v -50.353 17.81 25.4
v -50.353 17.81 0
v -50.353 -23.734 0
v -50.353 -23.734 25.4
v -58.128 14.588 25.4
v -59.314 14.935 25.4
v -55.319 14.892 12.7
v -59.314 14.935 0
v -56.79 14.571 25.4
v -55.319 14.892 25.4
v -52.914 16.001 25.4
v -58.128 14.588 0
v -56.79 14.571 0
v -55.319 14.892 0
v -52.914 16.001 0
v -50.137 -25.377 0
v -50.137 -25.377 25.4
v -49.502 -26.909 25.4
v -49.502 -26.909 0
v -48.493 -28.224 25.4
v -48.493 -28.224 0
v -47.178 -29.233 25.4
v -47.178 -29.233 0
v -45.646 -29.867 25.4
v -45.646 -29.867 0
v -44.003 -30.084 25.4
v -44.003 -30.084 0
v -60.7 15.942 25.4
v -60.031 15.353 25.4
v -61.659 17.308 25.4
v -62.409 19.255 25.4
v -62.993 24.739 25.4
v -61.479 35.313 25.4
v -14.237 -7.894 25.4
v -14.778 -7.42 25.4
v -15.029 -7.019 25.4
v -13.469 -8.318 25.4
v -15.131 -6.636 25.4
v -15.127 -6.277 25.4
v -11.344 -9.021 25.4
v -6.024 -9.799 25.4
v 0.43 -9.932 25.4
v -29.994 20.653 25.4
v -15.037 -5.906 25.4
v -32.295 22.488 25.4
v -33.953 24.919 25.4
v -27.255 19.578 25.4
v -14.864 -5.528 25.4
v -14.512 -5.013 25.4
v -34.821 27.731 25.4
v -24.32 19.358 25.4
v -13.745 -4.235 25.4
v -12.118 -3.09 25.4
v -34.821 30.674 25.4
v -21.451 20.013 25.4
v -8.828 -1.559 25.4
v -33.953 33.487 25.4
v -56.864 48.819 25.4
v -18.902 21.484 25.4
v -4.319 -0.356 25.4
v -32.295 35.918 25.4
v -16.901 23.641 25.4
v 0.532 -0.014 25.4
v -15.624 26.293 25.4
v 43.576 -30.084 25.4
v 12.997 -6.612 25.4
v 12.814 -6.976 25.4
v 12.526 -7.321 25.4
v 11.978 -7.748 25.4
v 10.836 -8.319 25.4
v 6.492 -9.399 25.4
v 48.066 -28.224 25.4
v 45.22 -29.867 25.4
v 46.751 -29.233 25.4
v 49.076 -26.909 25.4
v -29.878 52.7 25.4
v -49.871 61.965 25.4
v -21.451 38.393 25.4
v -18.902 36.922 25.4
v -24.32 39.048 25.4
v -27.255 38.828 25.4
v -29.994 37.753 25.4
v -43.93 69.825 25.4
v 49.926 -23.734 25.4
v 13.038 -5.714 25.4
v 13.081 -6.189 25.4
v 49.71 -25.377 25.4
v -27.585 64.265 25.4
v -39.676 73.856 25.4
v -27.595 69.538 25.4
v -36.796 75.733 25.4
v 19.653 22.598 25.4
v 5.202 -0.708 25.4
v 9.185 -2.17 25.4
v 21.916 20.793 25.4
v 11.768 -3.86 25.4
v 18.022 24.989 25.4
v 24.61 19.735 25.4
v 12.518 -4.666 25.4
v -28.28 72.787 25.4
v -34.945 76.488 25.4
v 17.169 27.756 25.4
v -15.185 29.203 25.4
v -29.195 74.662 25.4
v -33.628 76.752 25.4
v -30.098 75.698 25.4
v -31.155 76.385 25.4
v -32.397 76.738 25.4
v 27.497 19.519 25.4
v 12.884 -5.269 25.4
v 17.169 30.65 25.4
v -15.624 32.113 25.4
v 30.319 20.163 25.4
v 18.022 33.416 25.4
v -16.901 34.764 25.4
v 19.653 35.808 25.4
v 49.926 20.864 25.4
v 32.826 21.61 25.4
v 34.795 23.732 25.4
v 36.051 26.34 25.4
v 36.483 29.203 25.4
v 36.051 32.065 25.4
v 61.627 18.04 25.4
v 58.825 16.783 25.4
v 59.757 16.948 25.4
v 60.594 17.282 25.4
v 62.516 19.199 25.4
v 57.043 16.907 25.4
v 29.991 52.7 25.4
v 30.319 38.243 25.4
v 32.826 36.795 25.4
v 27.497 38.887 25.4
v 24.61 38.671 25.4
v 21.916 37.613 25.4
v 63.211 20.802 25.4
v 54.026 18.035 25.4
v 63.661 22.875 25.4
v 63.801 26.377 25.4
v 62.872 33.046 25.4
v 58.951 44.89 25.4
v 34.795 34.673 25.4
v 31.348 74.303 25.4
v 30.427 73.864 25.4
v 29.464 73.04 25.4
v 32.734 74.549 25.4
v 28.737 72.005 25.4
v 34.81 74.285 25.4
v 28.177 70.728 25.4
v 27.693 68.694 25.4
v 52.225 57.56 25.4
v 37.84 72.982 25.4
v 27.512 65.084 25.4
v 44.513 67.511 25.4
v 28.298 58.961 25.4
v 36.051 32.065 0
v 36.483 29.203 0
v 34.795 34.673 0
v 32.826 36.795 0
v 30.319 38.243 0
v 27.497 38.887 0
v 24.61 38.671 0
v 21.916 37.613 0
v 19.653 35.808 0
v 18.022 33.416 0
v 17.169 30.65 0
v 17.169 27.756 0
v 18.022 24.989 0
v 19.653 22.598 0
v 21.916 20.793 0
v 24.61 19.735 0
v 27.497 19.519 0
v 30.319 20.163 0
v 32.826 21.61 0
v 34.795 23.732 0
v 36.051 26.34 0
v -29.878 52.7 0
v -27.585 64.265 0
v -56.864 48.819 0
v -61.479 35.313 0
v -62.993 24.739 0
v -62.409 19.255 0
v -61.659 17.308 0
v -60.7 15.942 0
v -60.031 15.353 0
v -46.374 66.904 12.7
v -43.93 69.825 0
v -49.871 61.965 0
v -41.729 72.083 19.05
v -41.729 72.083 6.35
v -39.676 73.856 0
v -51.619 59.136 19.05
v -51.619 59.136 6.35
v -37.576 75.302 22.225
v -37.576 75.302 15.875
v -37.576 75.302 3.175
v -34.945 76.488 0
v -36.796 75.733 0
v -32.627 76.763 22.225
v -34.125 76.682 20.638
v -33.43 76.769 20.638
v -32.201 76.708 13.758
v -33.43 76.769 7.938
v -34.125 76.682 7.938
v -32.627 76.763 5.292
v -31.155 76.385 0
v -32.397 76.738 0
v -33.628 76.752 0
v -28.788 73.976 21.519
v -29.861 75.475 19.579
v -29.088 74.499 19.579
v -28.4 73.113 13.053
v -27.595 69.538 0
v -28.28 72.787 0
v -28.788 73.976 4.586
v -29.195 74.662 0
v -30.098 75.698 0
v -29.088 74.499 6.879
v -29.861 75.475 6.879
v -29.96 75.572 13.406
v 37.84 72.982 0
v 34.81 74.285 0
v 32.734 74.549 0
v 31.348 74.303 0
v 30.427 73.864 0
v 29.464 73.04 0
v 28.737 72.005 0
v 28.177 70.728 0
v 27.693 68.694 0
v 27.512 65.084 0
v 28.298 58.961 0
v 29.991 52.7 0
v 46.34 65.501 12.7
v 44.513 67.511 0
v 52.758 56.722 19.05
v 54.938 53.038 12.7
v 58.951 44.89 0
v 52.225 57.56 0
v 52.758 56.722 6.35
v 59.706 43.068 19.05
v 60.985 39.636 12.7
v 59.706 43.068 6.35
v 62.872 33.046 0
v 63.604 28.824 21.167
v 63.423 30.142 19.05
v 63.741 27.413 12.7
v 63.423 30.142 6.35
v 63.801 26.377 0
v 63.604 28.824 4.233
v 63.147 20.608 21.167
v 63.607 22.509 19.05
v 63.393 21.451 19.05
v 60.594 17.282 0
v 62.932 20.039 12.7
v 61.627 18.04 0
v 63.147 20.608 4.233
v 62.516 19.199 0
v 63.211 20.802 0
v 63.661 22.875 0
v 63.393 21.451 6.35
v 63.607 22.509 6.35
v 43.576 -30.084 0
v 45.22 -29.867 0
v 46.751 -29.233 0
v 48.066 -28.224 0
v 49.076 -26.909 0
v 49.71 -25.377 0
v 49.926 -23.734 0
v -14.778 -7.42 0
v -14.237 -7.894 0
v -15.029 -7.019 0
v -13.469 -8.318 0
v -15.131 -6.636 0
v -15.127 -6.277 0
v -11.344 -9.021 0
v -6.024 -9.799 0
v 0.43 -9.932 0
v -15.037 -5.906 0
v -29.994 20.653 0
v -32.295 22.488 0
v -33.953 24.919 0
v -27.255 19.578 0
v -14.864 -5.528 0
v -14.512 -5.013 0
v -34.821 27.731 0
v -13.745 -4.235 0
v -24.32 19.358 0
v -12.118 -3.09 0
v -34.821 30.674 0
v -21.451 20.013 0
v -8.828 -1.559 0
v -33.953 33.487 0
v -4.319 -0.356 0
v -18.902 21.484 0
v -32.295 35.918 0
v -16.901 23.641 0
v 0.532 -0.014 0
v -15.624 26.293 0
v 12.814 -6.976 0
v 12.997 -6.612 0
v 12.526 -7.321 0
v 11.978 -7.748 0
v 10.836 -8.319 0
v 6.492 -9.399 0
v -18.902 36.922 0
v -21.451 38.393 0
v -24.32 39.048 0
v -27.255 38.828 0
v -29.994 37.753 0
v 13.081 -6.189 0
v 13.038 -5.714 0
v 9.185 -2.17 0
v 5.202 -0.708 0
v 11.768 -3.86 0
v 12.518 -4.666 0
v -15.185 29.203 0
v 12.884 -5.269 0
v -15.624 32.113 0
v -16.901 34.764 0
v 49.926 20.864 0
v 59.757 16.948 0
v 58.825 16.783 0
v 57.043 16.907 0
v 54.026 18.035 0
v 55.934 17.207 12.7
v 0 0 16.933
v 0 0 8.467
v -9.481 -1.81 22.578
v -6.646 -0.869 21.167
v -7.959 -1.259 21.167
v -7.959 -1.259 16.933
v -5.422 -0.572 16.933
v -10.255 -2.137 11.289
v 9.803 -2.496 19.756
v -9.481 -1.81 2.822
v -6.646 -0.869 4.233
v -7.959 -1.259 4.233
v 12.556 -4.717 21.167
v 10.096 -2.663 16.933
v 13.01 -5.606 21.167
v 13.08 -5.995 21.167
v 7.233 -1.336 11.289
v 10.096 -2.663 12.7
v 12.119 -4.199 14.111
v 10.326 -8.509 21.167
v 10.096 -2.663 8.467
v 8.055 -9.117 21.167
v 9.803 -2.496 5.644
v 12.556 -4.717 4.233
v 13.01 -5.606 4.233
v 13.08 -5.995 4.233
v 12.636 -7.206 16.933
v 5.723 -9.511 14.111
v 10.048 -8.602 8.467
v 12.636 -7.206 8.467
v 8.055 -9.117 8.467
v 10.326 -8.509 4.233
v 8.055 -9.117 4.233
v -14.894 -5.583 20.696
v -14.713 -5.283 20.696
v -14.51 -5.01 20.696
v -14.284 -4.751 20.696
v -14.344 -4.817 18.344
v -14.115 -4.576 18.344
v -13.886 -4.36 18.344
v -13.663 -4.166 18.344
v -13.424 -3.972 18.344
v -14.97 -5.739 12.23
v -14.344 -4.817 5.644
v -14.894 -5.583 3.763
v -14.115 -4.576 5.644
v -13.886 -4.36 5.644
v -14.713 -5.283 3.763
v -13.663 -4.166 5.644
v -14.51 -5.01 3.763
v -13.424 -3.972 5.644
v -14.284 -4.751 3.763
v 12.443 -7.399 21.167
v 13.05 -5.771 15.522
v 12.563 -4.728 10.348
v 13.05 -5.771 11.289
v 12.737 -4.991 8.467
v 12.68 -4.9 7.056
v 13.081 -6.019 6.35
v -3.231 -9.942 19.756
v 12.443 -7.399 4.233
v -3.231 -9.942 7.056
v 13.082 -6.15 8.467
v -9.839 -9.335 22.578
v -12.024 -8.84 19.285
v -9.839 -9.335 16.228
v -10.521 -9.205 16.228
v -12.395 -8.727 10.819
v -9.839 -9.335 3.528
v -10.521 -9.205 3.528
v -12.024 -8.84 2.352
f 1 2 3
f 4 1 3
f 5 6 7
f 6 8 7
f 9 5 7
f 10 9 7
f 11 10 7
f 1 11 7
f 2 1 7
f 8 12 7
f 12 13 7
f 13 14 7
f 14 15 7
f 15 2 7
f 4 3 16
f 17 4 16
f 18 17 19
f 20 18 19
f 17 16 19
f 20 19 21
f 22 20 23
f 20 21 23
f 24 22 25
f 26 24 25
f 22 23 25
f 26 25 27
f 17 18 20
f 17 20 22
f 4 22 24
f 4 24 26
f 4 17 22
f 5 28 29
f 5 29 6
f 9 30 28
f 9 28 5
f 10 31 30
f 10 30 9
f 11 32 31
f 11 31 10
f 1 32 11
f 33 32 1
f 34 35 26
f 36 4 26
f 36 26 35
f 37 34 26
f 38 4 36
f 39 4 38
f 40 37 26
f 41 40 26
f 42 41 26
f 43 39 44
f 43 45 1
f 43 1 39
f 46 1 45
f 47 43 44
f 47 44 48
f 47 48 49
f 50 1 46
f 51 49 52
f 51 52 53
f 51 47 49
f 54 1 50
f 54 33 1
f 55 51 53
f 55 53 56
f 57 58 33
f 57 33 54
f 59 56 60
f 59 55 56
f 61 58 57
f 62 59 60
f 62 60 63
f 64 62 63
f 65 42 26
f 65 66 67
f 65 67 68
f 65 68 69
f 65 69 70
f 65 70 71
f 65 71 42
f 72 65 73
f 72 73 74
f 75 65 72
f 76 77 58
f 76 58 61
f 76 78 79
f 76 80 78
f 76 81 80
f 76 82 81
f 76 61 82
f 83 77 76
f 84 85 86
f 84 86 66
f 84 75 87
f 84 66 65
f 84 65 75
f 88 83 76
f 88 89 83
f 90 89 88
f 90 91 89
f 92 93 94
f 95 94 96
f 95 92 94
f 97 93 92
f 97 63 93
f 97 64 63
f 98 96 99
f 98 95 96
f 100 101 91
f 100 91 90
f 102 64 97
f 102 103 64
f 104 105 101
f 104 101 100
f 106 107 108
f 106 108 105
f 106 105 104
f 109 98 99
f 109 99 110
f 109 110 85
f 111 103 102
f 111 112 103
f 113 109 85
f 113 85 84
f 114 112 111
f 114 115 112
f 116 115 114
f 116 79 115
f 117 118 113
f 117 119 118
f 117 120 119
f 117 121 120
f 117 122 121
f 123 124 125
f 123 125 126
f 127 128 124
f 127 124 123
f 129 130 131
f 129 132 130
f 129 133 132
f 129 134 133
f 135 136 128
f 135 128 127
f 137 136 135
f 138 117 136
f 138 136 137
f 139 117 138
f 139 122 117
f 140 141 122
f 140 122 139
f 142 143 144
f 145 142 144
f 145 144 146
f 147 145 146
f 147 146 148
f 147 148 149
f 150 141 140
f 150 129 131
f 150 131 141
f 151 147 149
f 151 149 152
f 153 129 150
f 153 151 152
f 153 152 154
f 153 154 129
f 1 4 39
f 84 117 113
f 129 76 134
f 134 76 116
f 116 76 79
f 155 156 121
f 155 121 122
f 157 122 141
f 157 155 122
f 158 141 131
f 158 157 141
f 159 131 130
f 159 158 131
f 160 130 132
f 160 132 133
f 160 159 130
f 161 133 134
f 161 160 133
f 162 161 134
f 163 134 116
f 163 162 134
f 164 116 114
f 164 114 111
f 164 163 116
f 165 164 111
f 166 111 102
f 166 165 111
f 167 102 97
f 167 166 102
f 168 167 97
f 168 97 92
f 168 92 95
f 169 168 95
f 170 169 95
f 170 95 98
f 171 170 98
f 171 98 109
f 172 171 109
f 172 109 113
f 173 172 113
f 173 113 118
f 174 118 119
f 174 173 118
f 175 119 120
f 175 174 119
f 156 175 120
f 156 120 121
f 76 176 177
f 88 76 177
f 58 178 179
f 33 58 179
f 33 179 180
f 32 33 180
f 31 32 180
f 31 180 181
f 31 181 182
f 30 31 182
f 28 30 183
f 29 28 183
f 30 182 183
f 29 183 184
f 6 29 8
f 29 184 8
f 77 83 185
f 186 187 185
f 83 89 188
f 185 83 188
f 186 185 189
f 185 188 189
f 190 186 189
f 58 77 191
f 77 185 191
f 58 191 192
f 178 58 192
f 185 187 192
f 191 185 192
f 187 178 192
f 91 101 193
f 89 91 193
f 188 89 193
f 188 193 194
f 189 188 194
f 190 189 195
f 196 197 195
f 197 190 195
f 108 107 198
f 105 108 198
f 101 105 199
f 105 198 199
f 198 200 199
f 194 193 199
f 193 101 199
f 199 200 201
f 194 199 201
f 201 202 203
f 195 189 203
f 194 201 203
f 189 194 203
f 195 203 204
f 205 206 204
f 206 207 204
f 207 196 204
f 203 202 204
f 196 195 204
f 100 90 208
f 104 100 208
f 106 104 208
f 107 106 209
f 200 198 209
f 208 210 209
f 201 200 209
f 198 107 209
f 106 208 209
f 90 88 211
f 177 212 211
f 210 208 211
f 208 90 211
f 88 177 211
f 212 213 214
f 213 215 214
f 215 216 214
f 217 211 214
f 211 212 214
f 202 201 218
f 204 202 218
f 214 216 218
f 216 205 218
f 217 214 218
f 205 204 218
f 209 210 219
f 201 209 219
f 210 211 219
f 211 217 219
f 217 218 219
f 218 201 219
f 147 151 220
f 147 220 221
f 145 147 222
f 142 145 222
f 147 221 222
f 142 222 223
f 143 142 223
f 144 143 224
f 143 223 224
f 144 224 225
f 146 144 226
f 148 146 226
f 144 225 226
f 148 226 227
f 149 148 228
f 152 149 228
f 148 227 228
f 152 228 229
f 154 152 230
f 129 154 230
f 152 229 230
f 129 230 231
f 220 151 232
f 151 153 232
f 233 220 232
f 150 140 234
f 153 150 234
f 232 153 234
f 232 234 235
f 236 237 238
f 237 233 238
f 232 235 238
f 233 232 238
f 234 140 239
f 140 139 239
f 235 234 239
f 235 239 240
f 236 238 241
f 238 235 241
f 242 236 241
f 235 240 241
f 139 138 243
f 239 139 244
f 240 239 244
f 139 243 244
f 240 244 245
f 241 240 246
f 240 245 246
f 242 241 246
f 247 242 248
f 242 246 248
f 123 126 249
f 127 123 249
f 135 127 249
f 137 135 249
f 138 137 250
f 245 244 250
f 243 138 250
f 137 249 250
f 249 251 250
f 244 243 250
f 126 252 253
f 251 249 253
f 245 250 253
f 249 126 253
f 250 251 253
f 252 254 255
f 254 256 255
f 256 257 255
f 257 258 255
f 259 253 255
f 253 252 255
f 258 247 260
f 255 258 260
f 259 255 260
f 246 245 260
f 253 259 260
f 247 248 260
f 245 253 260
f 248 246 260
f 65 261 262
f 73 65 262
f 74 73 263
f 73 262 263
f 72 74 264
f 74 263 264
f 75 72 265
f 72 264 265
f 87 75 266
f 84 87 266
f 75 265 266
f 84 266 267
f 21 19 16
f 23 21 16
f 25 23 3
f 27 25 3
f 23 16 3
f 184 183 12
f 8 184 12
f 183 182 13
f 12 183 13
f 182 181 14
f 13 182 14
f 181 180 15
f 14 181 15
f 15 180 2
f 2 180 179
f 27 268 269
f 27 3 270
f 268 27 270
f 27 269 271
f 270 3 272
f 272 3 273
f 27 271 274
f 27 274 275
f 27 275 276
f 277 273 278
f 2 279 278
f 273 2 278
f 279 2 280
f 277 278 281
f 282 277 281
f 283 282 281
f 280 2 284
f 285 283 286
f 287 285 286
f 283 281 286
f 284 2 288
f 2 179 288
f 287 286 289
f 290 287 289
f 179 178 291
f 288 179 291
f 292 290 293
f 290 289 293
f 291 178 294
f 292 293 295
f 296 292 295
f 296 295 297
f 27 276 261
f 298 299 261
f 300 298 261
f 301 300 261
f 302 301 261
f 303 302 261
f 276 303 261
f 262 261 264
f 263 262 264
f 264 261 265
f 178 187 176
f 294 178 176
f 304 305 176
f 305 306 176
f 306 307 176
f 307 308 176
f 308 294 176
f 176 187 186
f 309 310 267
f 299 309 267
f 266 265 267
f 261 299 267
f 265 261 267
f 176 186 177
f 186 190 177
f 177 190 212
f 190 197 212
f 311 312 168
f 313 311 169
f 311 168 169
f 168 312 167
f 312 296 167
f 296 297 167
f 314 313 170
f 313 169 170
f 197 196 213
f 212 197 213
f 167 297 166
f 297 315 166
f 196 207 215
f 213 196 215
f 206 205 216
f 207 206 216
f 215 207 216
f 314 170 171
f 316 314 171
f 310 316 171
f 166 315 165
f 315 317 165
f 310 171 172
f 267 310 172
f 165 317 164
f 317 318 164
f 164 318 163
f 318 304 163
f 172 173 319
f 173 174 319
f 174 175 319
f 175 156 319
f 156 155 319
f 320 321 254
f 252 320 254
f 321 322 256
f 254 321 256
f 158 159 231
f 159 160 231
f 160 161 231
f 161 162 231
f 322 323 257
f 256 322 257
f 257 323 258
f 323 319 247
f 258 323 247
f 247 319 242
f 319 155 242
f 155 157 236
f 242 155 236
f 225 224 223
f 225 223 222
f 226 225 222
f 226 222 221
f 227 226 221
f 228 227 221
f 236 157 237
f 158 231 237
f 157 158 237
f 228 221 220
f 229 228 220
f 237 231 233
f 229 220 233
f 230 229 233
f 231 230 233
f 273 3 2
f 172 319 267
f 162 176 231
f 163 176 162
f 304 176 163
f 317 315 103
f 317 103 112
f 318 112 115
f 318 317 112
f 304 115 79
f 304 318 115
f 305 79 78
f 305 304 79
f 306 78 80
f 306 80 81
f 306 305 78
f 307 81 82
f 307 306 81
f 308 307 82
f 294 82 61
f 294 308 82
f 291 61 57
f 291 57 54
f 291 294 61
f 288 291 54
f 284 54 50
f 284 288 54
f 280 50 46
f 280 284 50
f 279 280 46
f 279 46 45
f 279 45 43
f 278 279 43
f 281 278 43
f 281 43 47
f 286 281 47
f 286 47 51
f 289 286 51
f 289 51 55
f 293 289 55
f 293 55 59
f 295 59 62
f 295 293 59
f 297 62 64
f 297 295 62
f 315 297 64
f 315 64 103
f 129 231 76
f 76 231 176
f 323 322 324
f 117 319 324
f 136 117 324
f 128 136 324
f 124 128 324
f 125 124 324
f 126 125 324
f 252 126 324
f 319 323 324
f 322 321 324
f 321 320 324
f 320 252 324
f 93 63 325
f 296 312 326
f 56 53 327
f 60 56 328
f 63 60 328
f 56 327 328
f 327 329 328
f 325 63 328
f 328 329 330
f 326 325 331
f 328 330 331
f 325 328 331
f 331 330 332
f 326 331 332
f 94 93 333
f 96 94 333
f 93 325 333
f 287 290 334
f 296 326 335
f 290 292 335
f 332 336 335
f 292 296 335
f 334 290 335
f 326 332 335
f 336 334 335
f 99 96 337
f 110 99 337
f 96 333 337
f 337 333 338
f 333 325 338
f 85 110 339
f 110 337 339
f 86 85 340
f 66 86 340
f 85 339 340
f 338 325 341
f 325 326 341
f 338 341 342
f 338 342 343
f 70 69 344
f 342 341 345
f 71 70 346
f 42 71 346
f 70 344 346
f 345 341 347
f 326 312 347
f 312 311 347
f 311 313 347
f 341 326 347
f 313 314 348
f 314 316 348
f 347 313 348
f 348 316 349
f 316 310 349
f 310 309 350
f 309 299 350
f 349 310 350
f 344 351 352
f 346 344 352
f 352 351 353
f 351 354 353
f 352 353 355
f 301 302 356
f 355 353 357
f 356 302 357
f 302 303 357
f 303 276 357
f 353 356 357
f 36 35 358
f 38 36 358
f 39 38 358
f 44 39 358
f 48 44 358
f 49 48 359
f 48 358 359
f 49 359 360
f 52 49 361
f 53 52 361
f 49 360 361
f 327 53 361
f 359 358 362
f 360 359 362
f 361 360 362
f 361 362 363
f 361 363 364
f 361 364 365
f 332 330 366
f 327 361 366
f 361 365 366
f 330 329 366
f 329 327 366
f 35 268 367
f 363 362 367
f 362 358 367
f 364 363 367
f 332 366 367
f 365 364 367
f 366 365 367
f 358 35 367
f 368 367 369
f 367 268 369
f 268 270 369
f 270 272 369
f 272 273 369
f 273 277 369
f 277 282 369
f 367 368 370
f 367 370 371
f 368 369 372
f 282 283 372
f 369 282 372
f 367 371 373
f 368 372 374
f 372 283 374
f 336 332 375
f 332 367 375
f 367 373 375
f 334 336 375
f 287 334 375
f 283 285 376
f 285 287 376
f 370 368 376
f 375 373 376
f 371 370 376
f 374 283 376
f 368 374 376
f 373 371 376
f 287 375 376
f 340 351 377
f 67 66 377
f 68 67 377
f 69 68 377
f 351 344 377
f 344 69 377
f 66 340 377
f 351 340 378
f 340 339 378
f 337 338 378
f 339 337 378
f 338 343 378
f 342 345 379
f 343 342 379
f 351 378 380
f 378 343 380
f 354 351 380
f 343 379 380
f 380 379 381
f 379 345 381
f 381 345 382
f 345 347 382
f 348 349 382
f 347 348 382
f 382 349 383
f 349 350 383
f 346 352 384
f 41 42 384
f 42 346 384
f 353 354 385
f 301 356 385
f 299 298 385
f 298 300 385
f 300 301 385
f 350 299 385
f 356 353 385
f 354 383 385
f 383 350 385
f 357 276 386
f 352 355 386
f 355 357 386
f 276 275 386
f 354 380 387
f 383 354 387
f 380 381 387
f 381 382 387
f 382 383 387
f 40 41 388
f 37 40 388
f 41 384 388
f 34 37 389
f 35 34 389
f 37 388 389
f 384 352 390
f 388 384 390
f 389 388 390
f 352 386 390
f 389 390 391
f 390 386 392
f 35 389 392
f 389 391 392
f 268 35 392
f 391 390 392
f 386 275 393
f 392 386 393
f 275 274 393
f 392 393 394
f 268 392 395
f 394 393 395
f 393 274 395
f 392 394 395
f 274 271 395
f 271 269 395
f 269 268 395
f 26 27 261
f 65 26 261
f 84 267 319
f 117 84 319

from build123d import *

# Parameters (mm, degrees)
F0_R     = 9.8728089089
F0_R_2   = 9.7111986955
F2_DEPTH = 25.4
F4_DEPTH = 25.4


# Not quite as in the source:
# - a feature of the source that left no trace in its solid (it failed there, or was rolled back) is left out


with BuildPart() as f2:
    # F0 (on Top) → F2 (new body)
    with BuildSketch(Plane.XY):
        with BuildLine():
            Line((49.9262437224, 52.69991979), (-50.352960825, 52.69991979))
            Line((-50.352960825, 52.69991979), (-50.352960825, -23.7337587565))
            ThreePointArc((-50.352960825, -23.7337587565), (-48.4930888855, -28.2238868171), (-44.002960825, -30.0837587565))
            Line((-44.002960825, -30.0837587565), (43.5762437224, -30.0837587565))
            ThreePointArc((43.5762437224, -30.0837587565), (48.066371783, -28.2238868171), (49.9262437224, -23.7337587565))
            Line((49.9262437224, -23.7337587565), (49.9262437224, 52.69991979))
        make_face()
        with BuildLine():
            add(Edge.make_bspline(
                [(-14.7778214887, -7.4204108678), (-17.0474622449, -4.724920884), (0.0101588176, 4.661771469), (24.9215305111, -10.7341156747), (-11.8554777737, -10.8910694692), (-14.7778214887, -7.4204108678)],
                knots=[0, 0, 0, 0, 0.310030383, 0.6008111246, 1, 1, 1, 1], degree=3))
        make_face(mode=Mode.SUBTRACT)
        with Locations((-25.0580441207, 29.2028859258)):
            Circle(F0_R, mode=Mode.SUBTRACT)
        with Locations((26.771415025, 29.2028859258)):
            Circle(F0_R_2, mode=Mode.SUBTRACT)
    extrude(amount=F2_DEPTH)

    # F1 (on face) → F4 (join)
    with BuildSketch(Plane.XY):
        with BuildLine():
            add(Edge.make_bspline(
                [(-29.878199615, 52.69991979), (-13.1223447166, 109.563974095), (-46.3737055212, 66.904188779), (-79.6250663257, 24.2444034629), (-59.3140795827, 14.9352001026)],
                knots=[1.9591551893, 1.9591551893, 1.9591551893, 4.1211702482, 4.1211702482, 6.2831853072, 6.2831853072, 6.2831853072], degree=2, weights=[1, 0.4704395266, 1, 0.4704395266, 1]))
            add(Edge.make_bspline(
                [(-59.3140795827, 14.9352001026), (-55.828433528, 13.3376121383), (-50.352960825, 17.8096105923)],
                knots=[0, 0, 0, 0.6228628932, 0.6228628932, 0.6228628932], degree=2, weights=[1, 0.9518959192, 1]))
            Line((-50.352960825, 17.8096105923), (-50.352960825, 52.69991979))
            Line((-50.352960825, 52.69991979), (-29.878199615, 52.69991979))
        make_face()
        with BuildLine():
            add(Edge.make_bspline(
                [(60.5942457914, 17.282159999), (79.4357554833, 27.198748734), (46.3404123224, 65.5008495201), (13.2450691614, 103.8029503062), (29.9911485665, 52.69991979)],
                knots=[0, 0, 0, 2.1384468293, 2.1384468293, 4.2768936586, 4.2768936586, 4.2768936586], degree=2, weights=[1, 0.4808053052, 1, 0.4808053052, 1]))
            Line((29.9911485665, 52.69991979), (49.9262437224, 52.69991979))
            Line((49.9262437224, 52.69991979), (49.9262437224, 20.8637133092))
            add(Edge.make_bspline(
                [(49.9262437224, 20.8637133092), (56.655587103, 15.2091807623), (60.5942457914, 17.282159999)],
                knots=[5.5547572315, 5.5547572315, 5.5547572315, 6.2831853072, 6.2831853072, 6.2831853072], degree=2, weights=[1, 0.9344040212, 1]))
        make_face()
    extrude(amount=F4_DEPTH)


solid = f2.part
